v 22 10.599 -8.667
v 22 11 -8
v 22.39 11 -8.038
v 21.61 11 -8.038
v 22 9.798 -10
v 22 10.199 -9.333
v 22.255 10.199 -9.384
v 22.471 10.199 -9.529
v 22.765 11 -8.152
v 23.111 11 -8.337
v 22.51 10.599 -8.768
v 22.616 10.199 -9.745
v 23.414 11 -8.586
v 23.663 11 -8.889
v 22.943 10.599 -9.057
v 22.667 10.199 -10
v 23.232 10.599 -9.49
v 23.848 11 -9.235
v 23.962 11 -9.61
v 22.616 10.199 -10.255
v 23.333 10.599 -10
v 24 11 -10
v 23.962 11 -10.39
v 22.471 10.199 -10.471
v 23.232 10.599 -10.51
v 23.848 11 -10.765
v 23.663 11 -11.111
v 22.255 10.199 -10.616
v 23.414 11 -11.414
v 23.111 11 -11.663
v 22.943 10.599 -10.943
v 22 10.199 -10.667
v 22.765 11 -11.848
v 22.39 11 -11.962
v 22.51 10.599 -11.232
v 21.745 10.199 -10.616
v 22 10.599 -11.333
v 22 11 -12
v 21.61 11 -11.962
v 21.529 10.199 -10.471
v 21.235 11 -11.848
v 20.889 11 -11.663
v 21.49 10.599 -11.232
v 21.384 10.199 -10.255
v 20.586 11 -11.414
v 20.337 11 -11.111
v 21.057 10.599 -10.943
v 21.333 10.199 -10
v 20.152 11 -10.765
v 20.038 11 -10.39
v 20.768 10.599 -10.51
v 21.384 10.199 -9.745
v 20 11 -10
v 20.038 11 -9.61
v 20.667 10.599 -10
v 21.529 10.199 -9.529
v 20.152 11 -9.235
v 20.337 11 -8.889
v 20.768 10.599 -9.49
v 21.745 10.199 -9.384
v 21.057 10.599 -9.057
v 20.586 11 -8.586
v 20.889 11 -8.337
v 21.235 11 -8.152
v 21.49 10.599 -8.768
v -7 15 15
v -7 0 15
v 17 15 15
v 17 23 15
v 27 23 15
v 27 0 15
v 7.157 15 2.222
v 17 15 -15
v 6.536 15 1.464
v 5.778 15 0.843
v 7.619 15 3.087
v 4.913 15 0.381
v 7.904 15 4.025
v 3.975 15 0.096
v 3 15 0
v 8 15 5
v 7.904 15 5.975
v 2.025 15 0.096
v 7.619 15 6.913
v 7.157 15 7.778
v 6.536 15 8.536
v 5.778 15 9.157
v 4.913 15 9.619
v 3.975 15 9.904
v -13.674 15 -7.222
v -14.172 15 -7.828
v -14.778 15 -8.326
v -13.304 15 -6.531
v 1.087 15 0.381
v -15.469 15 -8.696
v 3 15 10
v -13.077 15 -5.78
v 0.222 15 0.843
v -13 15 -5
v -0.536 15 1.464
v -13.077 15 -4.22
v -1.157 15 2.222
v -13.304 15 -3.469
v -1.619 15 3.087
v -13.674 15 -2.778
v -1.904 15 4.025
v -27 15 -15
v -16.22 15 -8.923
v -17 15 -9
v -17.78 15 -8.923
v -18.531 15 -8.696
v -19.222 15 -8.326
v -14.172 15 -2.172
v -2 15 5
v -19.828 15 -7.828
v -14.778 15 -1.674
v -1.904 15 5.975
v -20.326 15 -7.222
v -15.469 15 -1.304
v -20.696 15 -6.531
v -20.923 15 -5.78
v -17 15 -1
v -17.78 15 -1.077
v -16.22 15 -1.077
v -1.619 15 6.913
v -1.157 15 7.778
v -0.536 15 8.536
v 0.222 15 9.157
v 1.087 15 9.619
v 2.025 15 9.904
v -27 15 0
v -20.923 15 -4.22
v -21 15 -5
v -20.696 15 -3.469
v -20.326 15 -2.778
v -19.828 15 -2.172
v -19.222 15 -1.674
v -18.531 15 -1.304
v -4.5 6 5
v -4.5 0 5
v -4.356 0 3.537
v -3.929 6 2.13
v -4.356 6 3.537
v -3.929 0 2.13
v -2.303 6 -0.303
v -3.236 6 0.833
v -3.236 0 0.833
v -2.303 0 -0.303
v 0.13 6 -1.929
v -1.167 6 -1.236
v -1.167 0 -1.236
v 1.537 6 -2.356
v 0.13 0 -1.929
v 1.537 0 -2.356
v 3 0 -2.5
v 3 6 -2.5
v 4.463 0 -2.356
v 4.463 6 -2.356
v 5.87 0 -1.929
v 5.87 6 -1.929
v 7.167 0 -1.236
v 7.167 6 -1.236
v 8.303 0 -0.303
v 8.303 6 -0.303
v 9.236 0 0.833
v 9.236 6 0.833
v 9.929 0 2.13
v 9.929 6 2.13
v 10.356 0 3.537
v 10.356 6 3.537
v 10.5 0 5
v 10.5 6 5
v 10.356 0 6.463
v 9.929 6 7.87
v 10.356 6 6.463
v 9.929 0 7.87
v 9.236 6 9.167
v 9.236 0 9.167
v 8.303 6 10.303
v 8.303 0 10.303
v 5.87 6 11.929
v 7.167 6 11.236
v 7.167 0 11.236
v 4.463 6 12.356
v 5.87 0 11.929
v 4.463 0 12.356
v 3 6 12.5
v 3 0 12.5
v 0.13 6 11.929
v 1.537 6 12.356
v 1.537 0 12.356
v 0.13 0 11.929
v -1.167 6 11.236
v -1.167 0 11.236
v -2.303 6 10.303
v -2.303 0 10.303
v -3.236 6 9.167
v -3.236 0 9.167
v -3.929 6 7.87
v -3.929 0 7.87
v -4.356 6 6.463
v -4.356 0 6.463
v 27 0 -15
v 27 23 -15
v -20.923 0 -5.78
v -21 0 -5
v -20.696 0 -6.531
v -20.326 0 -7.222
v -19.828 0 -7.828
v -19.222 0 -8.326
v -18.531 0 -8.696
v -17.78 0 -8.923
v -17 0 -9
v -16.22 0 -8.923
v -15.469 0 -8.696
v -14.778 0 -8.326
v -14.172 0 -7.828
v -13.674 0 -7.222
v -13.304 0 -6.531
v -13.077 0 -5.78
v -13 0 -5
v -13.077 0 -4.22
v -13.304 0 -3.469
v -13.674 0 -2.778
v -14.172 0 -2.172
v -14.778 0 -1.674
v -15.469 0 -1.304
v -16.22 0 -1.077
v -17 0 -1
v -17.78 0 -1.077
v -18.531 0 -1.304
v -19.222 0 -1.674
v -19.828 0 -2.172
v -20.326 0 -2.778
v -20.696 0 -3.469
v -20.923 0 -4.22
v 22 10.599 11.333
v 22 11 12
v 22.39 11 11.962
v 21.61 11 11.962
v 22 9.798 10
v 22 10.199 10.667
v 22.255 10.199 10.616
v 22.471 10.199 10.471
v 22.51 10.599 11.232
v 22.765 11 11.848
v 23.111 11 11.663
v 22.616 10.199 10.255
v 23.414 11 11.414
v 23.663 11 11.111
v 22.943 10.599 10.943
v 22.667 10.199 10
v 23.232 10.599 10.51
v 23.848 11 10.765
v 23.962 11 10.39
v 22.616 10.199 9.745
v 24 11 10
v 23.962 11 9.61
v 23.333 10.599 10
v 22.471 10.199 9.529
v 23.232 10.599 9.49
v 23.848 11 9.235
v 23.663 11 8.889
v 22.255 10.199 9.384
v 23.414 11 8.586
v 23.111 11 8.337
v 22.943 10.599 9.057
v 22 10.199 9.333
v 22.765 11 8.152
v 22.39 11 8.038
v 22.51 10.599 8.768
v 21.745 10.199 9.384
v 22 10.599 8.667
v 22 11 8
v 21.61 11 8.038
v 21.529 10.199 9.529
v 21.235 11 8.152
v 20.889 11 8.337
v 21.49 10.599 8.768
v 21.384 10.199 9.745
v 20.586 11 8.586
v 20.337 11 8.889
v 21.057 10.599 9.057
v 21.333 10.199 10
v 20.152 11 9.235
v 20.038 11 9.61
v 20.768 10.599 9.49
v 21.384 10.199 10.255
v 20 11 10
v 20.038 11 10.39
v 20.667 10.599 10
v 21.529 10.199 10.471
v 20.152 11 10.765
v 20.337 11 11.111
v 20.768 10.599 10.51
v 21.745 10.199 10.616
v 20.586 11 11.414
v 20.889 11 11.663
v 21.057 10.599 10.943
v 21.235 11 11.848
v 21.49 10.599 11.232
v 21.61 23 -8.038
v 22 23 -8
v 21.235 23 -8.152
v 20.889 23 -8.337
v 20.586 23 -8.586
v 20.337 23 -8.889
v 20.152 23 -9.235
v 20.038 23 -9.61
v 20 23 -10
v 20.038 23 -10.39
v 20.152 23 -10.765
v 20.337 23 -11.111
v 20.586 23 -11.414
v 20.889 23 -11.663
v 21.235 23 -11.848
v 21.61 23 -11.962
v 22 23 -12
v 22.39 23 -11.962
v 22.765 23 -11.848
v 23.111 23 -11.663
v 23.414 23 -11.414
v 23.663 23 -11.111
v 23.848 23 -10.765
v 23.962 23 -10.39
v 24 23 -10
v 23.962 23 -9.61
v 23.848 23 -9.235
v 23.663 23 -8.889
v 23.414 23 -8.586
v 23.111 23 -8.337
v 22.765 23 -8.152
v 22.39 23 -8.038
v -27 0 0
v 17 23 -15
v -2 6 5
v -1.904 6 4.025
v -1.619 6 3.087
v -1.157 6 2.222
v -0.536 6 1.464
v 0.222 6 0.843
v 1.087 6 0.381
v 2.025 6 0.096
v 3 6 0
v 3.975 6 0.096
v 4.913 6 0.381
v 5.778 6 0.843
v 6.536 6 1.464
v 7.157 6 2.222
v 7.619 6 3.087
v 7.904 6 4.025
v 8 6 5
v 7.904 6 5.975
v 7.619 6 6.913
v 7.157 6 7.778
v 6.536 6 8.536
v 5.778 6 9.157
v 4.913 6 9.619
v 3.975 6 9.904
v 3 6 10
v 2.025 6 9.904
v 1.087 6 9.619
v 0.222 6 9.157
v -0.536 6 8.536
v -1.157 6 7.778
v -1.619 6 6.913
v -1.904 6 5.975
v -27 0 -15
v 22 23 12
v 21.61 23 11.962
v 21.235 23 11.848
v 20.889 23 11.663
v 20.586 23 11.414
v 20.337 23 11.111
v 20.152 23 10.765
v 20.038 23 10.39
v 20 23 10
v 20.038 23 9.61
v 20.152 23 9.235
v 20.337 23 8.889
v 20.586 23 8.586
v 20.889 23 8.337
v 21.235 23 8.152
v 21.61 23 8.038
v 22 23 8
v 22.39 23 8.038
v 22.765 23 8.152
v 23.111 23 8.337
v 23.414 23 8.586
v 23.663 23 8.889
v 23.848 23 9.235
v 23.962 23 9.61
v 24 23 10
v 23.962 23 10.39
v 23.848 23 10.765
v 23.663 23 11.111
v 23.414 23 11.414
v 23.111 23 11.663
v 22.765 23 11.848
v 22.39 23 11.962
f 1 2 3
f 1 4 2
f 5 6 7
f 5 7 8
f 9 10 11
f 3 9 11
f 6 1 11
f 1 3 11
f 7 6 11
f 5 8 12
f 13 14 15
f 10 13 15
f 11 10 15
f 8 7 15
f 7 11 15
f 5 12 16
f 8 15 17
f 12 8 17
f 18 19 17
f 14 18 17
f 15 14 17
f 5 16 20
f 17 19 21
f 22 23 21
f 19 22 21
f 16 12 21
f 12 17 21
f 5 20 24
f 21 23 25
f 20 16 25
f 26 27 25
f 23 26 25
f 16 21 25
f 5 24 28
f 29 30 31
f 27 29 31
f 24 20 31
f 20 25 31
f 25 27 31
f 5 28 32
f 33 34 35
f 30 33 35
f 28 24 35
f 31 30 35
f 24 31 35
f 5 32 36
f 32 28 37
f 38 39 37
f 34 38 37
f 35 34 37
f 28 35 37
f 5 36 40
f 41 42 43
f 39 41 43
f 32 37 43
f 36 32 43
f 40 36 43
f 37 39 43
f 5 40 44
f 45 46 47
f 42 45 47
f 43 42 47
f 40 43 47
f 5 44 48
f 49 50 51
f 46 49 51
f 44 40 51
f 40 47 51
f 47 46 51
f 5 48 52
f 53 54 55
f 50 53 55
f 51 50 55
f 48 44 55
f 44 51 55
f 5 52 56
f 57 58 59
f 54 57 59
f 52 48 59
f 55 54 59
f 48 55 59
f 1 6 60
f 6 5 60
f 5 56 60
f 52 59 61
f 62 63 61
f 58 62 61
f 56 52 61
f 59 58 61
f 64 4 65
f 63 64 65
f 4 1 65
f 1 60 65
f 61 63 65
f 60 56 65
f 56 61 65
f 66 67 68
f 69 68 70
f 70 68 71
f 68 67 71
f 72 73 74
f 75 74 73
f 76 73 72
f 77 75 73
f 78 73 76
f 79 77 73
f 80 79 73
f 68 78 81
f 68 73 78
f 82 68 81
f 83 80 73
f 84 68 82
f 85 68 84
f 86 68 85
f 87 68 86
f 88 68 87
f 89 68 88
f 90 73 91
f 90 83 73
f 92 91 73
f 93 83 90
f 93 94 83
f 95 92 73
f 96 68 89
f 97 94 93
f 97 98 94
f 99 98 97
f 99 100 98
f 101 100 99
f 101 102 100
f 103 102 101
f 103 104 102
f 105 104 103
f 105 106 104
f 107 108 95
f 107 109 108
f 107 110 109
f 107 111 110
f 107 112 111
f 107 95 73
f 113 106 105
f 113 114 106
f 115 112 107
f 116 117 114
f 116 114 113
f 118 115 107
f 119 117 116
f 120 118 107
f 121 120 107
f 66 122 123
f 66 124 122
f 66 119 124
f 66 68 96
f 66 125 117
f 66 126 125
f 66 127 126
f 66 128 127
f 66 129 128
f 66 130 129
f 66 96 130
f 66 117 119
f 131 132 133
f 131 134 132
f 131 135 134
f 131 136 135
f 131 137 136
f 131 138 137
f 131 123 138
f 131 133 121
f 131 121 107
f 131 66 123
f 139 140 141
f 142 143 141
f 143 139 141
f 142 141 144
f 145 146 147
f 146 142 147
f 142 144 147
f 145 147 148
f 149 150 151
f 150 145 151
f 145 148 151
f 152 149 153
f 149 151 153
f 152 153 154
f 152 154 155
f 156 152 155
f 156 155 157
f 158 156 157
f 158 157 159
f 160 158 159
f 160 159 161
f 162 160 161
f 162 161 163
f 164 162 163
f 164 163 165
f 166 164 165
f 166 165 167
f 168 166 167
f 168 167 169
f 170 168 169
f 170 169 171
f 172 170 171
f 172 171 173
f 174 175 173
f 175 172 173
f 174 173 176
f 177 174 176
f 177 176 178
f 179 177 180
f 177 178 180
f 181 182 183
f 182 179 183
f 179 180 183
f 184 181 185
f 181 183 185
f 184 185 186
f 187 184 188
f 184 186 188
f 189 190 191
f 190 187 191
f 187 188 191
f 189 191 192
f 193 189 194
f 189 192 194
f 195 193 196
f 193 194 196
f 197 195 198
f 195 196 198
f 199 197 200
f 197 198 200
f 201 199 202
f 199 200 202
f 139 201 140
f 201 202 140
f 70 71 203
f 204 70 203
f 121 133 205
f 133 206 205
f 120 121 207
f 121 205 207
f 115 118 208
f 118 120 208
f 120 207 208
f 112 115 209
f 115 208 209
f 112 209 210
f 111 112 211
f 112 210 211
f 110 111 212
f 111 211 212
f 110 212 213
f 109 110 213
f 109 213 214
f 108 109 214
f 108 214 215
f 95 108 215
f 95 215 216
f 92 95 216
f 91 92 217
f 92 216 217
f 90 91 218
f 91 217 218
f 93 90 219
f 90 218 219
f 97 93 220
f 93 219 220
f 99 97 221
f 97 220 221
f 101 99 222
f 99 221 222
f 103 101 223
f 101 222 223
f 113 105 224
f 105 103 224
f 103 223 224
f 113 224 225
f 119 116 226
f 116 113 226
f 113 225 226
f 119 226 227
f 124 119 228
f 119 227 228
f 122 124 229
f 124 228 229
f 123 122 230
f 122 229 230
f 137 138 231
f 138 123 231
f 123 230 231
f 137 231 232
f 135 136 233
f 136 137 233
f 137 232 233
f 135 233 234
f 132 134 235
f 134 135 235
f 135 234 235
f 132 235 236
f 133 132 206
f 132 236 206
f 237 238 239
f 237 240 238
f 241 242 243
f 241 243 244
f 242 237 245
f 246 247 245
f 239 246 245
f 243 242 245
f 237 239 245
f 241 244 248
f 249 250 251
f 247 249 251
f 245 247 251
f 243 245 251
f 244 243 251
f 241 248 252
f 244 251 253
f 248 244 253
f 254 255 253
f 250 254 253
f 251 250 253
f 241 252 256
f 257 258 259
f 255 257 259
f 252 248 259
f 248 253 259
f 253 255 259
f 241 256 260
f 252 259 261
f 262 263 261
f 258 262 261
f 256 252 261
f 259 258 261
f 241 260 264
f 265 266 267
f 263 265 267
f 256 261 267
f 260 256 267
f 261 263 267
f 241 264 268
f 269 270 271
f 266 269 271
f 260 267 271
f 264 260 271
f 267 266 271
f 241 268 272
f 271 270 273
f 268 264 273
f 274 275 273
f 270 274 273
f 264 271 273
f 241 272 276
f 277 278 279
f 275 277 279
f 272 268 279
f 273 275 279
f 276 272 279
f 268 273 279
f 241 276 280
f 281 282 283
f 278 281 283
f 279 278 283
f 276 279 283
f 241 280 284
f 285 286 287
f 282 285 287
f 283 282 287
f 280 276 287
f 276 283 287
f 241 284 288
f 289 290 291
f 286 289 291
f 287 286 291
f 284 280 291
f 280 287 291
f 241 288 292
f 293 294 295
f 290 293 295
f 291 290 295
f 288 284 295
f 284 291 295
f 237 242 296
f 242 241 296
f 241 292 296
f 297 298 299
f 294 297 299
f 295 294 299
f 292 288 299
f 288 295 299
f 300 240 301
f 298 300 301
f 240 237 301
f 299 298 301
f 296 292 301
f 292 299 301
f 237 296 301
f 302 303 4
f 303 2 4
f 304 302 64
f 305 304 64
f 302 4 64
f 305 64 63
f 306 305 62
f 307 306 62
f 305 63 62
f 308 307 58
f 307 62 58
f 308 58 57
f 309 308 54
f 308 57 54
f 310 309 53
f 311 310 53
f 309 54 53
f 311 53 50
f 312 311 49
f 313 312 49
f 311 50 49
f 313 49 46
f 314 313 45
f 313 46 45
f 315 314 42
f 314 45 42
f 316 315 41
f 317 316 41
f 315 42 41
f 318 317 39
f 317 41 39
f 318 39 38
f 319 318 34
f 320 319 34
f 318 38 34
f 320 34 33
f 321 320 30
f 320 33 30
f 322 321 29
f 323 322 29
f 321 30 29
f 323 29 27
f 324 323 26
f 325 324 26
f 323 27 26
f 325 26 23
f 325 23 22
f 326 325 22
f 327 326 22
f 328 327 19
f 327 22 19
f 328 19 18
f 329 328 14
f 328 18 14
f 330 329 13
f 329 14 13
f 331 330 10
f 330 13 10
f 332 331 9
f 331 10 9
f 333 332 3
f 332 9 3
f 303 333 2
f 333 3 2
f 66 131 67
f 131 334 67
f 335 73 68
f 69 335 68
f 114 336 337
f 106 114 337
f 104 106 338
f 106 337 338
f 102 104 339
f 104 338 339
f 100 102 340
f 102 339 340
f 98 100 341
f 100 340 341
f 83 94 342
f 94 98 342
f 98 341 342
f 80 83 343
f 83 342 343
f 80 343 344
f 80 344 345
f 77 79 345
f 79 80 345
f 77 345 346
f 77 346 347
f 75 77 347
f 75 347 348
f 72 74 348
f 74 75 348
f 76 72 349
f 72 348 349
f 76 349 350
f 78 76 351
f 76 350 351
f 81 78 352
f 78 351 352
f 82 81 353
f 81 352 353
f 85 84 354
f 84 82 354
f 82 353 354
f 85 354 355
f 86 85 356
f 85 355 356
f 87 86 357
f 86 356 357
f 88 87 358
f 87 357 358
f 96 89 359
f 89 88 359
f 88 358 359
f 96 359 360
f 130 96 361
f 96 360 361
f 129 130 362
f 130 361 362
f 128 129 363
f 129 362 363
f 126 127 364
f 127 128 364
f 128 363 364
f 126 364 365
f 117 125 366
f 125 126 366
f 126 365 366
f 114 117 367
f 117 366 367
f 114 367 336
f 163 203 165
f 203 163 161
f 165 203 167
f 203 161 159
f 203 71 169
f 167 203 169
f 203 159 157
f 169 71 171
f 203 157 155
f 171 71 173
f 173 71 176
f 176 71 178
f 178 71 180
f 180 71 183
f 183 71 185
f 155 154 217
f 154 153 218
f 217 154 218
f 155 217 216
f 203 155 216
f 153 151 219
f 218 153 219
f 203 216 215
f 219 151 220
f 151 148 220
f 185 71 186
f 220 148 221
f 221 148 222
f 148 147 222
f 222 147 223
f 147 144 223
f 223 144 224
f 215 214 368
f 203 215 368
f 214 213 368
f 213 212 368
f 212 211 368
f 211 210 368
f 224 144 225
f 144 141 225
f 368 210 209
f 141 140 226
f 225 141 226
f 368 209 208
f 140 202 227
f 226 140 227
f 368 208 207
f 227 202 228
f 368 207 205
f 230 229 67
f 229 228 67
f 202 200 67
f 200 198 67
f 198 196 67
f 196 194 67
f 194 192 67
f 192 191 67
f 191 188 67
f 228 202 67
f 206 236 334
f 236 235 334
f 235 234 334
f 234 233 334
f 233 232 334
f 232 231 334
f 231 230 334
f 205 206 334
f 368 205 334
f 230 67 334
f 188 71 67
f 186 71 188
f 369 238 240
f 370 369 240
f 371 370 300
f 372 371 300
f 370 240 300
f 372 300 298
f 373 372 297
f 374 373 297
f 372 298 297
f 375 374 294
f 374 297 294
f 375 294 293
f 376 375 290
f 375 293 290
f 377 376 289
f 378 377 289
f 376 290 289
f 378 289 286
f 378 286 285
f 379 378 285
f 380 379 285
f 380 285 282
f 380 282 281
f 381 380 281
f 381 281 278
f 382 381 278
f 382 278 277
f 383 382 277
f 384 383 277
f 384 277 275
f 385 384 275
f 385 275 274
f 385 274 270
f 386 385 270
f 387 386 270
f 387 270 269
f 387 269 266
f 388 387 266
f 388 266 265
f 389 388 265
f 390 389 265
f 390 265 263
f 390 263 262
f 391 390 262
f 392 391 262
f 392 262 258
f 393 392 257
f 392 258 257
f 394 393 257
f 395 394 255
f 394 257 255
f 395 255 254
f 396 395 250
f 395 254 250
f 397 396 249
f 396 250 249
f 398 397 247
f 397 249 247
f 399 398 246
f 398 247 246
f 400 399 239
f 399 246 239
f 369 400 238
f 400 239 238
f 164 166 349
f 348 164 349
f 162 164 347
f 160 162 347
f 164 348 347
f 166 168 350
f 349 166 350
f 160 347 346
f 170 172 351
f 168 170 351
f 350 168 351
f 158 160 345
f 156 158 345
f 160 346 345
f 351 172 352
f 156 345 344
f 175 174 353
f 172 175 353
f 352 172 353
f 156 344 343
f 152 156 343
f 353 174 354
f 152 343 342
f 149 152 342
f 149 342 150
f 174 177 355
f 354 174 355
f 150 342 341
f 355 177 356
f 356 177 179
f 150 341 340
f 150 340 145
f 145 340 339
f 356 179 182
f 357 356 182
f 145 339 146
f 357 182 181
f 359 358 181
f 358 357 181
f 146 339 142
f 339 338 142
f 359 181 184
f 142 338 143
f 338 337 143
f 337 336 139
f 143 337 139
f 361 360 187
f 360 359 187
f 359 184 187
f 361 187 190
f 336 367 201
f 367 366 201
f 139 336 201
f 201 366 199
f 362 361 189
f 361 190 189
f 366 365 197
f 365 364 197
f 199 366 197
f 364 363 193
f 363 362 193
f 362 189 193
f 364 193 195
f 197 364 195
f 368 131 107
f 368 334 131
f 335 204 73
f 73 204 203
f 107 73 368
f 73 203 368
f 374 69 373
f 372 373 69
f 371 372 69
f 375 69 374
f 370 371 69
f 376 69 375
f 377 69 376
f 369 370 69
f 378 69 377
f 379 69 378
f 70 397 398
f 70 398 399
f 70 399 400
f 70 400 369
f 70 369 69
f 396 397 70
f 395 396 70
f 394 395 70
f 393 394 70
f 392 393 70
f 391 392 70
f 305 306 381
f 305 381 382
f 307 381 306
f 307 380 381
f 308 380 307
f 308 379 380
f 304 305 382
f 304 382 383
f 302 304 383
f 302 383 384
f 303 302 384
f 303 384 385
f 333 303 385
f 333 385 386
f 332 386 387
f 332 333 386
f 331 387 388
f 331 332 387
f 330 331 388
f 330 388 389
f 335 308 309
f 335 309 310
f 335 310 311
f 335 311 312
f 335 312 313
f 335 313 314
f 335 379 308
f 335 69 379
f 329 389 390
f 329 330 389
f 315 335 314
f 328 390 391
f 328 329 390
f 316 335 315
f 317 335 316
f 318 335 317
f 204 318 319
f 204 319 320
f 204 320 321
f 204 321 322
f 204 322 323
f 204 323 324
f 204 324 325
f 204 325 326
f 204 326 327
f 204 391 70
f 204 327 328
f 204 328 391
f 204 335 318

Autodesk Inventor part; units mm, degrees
ref_plane "YZ Plane" through (0, 0, 0) normal (1, 0, 0) x (0, 1, 0)
ref_plane "XZ Plane" through (0, 0, 0) normal (0, 1, 0) x (-1, 0, 0)
ref_plane "XY Plane" through (0, 0, 0) normal (0, 0, 1) x (1, 0, 0)
sketch "草图1" plane through (0, 0, 0) normal (0, 1, 0) x (-1, 0, 0)
  line L0 (-27, 15) -> (7, 15)
  line L1 (27, 0) -> (27, -15)
  line L2 (27, -15) -> (-27, -15)
  line L3 (-27, -15) -> (-27, 15)
  line L4 (-27, 15) -> (27, -15) construction
  line L5 (27, 15) -> (-27, -15) construction
  line L6 (27, 0) -> (7, 15)
  circle A0 centre (17, -5) radius 4
  circle A1 centre (-3, 5) radius 5
  point P0 (0, 0)
  dimension "d0" = 54
  dimension "d1" = 30
  dimension "d2" = 20
  dimension "d3" = 8
  dimension "d4" = 10
  dimension "d5" = 10
  dimension "d6" = 10
  dimension "d7" = 20
  dimension "d8" = 30
extrude "拉伸1" add sketch "草图1" along normal blind 15
sketch "草图2" plane through (0, 0, 0) normal (0, 1, 0) x (-1, 0, 0)
  circle A0 centre (-3, 5) radius 5 projected
  circle A1 centre (17, -5) radius 4 projected
  line L0 (7, 15) -> (-27, 15) projected
  line L1 (-27, 15) -> (-27, -15) projected
  line L2 (-27, -15) -> (27, -15) projected
  line L3 (27, -15) -> (27, 0) projected
  line L4 (27, 0) -> (7, 15) projected
  circle A2 centre (-3, 5) radius 7.5
  point P0 (0, 0)
  dimension "d11" = 15
extrude "拉伸2" cut sketch "草图2" along normal blind 6 contours A2
sketch "草图3" plane through (0, 15, 0) normal (0, 1, 0) x (1, 0, 0)
  line L0 (-7, -15) -> (27, -15) projected
  line L1 (27, -15) -> (27, 15) projected
  line L2 (27, 15) -> (-27, 15) projected
  line L3 (17, 15) -> (17, -15)
  point P0 (0, 0)
  dimension "d14" = 10
extrude "拉伸3" add sketch "草图3" along normal blind 8
hole "孔1" at (22, 23, 10) direction (0, -1, 0) diameter 4 depth 12 tip angle 118
hole "孔2" at (22, 23, -10) direction (0, -1, 0) diameter 4 depth 12 tip angle 118
